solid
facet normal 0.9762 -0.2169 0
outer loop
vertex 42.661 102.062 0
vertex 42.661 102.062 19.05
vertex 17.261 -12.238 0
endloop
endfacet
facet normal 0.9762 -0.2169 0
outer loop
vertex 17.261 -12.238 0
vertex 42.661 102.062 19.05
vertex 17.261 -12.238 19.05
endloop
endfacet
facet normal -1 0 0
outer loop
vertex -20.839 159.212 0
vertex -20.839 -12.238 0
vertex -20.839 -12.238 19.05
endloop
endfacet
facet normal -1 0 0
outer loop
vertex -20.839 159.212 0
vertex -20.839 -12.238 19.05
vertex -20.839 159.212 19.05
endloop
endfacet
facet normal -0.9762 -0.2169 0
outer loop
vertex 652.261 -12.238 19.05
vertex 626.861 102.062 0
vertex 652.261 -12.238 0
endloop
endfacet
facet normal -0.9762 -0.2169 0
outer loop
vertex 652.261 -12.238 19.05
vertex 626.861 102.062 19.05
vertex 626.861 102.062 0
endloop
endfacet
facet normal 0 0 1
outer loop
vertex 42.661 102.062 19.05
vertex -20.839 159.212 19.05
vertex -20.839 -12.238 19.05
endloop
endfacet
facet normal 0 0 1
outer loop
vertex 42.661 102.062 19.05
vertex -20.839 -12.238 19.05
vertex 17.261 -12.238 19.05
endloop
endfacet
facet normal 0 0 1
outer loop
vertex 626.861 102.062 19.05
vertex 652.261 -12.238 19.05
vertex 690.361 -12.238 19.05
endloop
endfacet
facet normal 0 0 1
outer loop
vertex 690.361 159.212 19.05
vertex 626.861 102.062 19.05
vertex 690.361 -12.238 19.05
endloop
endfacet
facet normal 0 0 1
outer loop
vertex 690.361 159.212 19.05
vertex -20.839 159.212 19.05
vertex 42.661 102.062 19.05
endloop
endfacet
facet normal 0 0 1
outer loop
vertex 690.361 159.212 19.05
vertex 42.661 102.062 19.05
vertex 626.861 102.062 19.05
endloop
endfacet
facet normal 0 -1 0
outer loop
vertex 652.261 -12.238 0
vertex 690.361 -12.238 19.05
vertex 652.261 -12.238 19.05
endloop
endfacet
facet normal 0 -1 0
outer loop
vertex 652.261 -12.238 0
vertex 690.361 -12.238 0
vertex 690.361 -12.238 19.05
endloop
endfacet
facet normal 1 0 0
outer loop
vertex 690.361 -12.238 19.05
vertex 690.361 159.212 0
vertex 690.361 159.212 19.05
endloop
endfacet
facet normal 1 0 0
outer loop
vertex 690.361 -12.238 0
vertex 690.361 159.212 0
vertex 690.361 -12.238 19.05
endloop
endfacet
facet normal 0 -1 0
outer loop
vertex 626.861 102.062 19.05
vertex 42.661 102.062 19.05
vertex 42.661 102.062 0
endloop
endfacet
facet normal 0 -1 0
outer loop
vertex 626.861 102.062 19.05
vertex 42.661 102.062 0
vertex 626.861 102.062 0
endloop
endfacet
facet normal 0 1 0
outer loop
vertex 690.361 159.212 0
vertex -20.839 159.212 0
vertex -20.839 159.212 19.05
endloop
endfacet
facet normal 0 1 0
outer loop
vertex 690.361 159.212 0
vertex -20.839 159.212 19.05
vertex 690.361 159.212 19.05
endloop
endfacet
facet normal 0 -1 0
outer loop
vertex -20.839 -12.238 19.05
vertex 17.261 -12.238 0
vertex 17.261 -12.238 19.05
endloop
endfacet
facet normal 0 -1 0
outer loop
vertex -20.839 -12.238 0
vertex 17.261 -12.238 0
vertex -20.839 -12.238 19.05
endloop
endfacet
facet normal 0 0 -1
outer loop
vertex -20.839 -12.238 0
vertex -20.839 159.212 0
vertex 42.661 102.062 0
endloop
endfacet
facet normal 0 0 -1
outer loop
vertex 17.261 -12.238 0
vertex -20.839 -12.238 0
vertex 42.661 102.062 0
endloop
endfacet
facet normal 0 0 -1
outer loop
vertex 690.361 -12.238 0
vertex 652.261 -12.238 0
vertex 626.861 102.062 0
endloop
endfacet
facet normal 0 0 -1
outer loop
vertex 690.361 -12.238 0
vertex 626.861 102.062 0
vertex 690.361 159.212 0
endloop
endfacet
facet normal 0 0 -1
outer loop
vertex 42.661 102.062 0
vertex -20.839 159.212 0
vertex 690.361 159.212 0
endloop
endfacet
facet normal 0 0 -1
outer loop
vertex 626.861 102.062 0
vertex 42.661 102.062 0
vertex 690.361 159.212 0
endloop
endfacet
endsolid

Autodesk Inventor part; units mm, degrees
ref_plane "YZ Plane" through (0, 0, 0) normal (1, 0, 0) x (0, 1, 0)
ref_plane "XZ Plane" through (0, 0, 0) normal (0, 1, 0) x (-1, 0, 0)
ref_plane "XY Plane" through (0, 0, 0) normal (0, 0, 1) x (1, 0, 0)
sketch "Sketch1" plane through (0, 0, 0) normal (0, 0, 1) x (1, 0, 0)
  line L0 (-20.8392, 159.2122) -> (690.3608, 159.2122)
  line L1 (690.3608, 159.2122) -> (690.3608, -12.2378)
  line L2 (690.3608, -12.2378) -> (-20.8392, -12.2378)
  line L3 (-20.8392, -12.2378) -> (-20.8392, 159.2122)
  point P0 (0, 0)
  dimension "d0" = 171.45
  dimension "d1" = 711.2
extrude "Extrusion1" add sketch "Sketch1" along normal blind 19.05
sketch "Sketch2" plane through (0, 0, 19.05) normal (0, 0, 1) x (1, 0, 0)
  line L0 (690.3608, 159.2122) -> (690.3608, -12.2378) projected
  line L1 (-20.8392, -12.2378) -> (-20.8392, 159.2122) projected
  line L2 (690.3608, -12.2378) -> (-20.8392, -12.2378) projected
  line L3 (42.6608, 102.0622) -> (626.8608, 102.0622)
  line L4 (626.8608, 102.0622) -> (626.8608, -12.2378)
  line L5 (626.8608, -12.2378) -> (42.6608, -12.2378)
  line L6 (42.6608, -12.2378) -> (42.6608, 102.0622)
  line L7 (42.6608, 102.0622) -> (17.2608, -12.2378)
  line L8 (626.8608, 102.0622) -> (652.2608, -12.2378)
  point P0 (0, 0)
  dimension "d4" = 25.4
  dimension "d5" = 25.4
  dimension "d6" = 38.1
  dimension "d7" = 38.1
  dimension "d10" = 114.3
extrude "Extrusion2" cut sketch "Sketch2" against normal blind 19.05
properties part number "ridgidizer"
